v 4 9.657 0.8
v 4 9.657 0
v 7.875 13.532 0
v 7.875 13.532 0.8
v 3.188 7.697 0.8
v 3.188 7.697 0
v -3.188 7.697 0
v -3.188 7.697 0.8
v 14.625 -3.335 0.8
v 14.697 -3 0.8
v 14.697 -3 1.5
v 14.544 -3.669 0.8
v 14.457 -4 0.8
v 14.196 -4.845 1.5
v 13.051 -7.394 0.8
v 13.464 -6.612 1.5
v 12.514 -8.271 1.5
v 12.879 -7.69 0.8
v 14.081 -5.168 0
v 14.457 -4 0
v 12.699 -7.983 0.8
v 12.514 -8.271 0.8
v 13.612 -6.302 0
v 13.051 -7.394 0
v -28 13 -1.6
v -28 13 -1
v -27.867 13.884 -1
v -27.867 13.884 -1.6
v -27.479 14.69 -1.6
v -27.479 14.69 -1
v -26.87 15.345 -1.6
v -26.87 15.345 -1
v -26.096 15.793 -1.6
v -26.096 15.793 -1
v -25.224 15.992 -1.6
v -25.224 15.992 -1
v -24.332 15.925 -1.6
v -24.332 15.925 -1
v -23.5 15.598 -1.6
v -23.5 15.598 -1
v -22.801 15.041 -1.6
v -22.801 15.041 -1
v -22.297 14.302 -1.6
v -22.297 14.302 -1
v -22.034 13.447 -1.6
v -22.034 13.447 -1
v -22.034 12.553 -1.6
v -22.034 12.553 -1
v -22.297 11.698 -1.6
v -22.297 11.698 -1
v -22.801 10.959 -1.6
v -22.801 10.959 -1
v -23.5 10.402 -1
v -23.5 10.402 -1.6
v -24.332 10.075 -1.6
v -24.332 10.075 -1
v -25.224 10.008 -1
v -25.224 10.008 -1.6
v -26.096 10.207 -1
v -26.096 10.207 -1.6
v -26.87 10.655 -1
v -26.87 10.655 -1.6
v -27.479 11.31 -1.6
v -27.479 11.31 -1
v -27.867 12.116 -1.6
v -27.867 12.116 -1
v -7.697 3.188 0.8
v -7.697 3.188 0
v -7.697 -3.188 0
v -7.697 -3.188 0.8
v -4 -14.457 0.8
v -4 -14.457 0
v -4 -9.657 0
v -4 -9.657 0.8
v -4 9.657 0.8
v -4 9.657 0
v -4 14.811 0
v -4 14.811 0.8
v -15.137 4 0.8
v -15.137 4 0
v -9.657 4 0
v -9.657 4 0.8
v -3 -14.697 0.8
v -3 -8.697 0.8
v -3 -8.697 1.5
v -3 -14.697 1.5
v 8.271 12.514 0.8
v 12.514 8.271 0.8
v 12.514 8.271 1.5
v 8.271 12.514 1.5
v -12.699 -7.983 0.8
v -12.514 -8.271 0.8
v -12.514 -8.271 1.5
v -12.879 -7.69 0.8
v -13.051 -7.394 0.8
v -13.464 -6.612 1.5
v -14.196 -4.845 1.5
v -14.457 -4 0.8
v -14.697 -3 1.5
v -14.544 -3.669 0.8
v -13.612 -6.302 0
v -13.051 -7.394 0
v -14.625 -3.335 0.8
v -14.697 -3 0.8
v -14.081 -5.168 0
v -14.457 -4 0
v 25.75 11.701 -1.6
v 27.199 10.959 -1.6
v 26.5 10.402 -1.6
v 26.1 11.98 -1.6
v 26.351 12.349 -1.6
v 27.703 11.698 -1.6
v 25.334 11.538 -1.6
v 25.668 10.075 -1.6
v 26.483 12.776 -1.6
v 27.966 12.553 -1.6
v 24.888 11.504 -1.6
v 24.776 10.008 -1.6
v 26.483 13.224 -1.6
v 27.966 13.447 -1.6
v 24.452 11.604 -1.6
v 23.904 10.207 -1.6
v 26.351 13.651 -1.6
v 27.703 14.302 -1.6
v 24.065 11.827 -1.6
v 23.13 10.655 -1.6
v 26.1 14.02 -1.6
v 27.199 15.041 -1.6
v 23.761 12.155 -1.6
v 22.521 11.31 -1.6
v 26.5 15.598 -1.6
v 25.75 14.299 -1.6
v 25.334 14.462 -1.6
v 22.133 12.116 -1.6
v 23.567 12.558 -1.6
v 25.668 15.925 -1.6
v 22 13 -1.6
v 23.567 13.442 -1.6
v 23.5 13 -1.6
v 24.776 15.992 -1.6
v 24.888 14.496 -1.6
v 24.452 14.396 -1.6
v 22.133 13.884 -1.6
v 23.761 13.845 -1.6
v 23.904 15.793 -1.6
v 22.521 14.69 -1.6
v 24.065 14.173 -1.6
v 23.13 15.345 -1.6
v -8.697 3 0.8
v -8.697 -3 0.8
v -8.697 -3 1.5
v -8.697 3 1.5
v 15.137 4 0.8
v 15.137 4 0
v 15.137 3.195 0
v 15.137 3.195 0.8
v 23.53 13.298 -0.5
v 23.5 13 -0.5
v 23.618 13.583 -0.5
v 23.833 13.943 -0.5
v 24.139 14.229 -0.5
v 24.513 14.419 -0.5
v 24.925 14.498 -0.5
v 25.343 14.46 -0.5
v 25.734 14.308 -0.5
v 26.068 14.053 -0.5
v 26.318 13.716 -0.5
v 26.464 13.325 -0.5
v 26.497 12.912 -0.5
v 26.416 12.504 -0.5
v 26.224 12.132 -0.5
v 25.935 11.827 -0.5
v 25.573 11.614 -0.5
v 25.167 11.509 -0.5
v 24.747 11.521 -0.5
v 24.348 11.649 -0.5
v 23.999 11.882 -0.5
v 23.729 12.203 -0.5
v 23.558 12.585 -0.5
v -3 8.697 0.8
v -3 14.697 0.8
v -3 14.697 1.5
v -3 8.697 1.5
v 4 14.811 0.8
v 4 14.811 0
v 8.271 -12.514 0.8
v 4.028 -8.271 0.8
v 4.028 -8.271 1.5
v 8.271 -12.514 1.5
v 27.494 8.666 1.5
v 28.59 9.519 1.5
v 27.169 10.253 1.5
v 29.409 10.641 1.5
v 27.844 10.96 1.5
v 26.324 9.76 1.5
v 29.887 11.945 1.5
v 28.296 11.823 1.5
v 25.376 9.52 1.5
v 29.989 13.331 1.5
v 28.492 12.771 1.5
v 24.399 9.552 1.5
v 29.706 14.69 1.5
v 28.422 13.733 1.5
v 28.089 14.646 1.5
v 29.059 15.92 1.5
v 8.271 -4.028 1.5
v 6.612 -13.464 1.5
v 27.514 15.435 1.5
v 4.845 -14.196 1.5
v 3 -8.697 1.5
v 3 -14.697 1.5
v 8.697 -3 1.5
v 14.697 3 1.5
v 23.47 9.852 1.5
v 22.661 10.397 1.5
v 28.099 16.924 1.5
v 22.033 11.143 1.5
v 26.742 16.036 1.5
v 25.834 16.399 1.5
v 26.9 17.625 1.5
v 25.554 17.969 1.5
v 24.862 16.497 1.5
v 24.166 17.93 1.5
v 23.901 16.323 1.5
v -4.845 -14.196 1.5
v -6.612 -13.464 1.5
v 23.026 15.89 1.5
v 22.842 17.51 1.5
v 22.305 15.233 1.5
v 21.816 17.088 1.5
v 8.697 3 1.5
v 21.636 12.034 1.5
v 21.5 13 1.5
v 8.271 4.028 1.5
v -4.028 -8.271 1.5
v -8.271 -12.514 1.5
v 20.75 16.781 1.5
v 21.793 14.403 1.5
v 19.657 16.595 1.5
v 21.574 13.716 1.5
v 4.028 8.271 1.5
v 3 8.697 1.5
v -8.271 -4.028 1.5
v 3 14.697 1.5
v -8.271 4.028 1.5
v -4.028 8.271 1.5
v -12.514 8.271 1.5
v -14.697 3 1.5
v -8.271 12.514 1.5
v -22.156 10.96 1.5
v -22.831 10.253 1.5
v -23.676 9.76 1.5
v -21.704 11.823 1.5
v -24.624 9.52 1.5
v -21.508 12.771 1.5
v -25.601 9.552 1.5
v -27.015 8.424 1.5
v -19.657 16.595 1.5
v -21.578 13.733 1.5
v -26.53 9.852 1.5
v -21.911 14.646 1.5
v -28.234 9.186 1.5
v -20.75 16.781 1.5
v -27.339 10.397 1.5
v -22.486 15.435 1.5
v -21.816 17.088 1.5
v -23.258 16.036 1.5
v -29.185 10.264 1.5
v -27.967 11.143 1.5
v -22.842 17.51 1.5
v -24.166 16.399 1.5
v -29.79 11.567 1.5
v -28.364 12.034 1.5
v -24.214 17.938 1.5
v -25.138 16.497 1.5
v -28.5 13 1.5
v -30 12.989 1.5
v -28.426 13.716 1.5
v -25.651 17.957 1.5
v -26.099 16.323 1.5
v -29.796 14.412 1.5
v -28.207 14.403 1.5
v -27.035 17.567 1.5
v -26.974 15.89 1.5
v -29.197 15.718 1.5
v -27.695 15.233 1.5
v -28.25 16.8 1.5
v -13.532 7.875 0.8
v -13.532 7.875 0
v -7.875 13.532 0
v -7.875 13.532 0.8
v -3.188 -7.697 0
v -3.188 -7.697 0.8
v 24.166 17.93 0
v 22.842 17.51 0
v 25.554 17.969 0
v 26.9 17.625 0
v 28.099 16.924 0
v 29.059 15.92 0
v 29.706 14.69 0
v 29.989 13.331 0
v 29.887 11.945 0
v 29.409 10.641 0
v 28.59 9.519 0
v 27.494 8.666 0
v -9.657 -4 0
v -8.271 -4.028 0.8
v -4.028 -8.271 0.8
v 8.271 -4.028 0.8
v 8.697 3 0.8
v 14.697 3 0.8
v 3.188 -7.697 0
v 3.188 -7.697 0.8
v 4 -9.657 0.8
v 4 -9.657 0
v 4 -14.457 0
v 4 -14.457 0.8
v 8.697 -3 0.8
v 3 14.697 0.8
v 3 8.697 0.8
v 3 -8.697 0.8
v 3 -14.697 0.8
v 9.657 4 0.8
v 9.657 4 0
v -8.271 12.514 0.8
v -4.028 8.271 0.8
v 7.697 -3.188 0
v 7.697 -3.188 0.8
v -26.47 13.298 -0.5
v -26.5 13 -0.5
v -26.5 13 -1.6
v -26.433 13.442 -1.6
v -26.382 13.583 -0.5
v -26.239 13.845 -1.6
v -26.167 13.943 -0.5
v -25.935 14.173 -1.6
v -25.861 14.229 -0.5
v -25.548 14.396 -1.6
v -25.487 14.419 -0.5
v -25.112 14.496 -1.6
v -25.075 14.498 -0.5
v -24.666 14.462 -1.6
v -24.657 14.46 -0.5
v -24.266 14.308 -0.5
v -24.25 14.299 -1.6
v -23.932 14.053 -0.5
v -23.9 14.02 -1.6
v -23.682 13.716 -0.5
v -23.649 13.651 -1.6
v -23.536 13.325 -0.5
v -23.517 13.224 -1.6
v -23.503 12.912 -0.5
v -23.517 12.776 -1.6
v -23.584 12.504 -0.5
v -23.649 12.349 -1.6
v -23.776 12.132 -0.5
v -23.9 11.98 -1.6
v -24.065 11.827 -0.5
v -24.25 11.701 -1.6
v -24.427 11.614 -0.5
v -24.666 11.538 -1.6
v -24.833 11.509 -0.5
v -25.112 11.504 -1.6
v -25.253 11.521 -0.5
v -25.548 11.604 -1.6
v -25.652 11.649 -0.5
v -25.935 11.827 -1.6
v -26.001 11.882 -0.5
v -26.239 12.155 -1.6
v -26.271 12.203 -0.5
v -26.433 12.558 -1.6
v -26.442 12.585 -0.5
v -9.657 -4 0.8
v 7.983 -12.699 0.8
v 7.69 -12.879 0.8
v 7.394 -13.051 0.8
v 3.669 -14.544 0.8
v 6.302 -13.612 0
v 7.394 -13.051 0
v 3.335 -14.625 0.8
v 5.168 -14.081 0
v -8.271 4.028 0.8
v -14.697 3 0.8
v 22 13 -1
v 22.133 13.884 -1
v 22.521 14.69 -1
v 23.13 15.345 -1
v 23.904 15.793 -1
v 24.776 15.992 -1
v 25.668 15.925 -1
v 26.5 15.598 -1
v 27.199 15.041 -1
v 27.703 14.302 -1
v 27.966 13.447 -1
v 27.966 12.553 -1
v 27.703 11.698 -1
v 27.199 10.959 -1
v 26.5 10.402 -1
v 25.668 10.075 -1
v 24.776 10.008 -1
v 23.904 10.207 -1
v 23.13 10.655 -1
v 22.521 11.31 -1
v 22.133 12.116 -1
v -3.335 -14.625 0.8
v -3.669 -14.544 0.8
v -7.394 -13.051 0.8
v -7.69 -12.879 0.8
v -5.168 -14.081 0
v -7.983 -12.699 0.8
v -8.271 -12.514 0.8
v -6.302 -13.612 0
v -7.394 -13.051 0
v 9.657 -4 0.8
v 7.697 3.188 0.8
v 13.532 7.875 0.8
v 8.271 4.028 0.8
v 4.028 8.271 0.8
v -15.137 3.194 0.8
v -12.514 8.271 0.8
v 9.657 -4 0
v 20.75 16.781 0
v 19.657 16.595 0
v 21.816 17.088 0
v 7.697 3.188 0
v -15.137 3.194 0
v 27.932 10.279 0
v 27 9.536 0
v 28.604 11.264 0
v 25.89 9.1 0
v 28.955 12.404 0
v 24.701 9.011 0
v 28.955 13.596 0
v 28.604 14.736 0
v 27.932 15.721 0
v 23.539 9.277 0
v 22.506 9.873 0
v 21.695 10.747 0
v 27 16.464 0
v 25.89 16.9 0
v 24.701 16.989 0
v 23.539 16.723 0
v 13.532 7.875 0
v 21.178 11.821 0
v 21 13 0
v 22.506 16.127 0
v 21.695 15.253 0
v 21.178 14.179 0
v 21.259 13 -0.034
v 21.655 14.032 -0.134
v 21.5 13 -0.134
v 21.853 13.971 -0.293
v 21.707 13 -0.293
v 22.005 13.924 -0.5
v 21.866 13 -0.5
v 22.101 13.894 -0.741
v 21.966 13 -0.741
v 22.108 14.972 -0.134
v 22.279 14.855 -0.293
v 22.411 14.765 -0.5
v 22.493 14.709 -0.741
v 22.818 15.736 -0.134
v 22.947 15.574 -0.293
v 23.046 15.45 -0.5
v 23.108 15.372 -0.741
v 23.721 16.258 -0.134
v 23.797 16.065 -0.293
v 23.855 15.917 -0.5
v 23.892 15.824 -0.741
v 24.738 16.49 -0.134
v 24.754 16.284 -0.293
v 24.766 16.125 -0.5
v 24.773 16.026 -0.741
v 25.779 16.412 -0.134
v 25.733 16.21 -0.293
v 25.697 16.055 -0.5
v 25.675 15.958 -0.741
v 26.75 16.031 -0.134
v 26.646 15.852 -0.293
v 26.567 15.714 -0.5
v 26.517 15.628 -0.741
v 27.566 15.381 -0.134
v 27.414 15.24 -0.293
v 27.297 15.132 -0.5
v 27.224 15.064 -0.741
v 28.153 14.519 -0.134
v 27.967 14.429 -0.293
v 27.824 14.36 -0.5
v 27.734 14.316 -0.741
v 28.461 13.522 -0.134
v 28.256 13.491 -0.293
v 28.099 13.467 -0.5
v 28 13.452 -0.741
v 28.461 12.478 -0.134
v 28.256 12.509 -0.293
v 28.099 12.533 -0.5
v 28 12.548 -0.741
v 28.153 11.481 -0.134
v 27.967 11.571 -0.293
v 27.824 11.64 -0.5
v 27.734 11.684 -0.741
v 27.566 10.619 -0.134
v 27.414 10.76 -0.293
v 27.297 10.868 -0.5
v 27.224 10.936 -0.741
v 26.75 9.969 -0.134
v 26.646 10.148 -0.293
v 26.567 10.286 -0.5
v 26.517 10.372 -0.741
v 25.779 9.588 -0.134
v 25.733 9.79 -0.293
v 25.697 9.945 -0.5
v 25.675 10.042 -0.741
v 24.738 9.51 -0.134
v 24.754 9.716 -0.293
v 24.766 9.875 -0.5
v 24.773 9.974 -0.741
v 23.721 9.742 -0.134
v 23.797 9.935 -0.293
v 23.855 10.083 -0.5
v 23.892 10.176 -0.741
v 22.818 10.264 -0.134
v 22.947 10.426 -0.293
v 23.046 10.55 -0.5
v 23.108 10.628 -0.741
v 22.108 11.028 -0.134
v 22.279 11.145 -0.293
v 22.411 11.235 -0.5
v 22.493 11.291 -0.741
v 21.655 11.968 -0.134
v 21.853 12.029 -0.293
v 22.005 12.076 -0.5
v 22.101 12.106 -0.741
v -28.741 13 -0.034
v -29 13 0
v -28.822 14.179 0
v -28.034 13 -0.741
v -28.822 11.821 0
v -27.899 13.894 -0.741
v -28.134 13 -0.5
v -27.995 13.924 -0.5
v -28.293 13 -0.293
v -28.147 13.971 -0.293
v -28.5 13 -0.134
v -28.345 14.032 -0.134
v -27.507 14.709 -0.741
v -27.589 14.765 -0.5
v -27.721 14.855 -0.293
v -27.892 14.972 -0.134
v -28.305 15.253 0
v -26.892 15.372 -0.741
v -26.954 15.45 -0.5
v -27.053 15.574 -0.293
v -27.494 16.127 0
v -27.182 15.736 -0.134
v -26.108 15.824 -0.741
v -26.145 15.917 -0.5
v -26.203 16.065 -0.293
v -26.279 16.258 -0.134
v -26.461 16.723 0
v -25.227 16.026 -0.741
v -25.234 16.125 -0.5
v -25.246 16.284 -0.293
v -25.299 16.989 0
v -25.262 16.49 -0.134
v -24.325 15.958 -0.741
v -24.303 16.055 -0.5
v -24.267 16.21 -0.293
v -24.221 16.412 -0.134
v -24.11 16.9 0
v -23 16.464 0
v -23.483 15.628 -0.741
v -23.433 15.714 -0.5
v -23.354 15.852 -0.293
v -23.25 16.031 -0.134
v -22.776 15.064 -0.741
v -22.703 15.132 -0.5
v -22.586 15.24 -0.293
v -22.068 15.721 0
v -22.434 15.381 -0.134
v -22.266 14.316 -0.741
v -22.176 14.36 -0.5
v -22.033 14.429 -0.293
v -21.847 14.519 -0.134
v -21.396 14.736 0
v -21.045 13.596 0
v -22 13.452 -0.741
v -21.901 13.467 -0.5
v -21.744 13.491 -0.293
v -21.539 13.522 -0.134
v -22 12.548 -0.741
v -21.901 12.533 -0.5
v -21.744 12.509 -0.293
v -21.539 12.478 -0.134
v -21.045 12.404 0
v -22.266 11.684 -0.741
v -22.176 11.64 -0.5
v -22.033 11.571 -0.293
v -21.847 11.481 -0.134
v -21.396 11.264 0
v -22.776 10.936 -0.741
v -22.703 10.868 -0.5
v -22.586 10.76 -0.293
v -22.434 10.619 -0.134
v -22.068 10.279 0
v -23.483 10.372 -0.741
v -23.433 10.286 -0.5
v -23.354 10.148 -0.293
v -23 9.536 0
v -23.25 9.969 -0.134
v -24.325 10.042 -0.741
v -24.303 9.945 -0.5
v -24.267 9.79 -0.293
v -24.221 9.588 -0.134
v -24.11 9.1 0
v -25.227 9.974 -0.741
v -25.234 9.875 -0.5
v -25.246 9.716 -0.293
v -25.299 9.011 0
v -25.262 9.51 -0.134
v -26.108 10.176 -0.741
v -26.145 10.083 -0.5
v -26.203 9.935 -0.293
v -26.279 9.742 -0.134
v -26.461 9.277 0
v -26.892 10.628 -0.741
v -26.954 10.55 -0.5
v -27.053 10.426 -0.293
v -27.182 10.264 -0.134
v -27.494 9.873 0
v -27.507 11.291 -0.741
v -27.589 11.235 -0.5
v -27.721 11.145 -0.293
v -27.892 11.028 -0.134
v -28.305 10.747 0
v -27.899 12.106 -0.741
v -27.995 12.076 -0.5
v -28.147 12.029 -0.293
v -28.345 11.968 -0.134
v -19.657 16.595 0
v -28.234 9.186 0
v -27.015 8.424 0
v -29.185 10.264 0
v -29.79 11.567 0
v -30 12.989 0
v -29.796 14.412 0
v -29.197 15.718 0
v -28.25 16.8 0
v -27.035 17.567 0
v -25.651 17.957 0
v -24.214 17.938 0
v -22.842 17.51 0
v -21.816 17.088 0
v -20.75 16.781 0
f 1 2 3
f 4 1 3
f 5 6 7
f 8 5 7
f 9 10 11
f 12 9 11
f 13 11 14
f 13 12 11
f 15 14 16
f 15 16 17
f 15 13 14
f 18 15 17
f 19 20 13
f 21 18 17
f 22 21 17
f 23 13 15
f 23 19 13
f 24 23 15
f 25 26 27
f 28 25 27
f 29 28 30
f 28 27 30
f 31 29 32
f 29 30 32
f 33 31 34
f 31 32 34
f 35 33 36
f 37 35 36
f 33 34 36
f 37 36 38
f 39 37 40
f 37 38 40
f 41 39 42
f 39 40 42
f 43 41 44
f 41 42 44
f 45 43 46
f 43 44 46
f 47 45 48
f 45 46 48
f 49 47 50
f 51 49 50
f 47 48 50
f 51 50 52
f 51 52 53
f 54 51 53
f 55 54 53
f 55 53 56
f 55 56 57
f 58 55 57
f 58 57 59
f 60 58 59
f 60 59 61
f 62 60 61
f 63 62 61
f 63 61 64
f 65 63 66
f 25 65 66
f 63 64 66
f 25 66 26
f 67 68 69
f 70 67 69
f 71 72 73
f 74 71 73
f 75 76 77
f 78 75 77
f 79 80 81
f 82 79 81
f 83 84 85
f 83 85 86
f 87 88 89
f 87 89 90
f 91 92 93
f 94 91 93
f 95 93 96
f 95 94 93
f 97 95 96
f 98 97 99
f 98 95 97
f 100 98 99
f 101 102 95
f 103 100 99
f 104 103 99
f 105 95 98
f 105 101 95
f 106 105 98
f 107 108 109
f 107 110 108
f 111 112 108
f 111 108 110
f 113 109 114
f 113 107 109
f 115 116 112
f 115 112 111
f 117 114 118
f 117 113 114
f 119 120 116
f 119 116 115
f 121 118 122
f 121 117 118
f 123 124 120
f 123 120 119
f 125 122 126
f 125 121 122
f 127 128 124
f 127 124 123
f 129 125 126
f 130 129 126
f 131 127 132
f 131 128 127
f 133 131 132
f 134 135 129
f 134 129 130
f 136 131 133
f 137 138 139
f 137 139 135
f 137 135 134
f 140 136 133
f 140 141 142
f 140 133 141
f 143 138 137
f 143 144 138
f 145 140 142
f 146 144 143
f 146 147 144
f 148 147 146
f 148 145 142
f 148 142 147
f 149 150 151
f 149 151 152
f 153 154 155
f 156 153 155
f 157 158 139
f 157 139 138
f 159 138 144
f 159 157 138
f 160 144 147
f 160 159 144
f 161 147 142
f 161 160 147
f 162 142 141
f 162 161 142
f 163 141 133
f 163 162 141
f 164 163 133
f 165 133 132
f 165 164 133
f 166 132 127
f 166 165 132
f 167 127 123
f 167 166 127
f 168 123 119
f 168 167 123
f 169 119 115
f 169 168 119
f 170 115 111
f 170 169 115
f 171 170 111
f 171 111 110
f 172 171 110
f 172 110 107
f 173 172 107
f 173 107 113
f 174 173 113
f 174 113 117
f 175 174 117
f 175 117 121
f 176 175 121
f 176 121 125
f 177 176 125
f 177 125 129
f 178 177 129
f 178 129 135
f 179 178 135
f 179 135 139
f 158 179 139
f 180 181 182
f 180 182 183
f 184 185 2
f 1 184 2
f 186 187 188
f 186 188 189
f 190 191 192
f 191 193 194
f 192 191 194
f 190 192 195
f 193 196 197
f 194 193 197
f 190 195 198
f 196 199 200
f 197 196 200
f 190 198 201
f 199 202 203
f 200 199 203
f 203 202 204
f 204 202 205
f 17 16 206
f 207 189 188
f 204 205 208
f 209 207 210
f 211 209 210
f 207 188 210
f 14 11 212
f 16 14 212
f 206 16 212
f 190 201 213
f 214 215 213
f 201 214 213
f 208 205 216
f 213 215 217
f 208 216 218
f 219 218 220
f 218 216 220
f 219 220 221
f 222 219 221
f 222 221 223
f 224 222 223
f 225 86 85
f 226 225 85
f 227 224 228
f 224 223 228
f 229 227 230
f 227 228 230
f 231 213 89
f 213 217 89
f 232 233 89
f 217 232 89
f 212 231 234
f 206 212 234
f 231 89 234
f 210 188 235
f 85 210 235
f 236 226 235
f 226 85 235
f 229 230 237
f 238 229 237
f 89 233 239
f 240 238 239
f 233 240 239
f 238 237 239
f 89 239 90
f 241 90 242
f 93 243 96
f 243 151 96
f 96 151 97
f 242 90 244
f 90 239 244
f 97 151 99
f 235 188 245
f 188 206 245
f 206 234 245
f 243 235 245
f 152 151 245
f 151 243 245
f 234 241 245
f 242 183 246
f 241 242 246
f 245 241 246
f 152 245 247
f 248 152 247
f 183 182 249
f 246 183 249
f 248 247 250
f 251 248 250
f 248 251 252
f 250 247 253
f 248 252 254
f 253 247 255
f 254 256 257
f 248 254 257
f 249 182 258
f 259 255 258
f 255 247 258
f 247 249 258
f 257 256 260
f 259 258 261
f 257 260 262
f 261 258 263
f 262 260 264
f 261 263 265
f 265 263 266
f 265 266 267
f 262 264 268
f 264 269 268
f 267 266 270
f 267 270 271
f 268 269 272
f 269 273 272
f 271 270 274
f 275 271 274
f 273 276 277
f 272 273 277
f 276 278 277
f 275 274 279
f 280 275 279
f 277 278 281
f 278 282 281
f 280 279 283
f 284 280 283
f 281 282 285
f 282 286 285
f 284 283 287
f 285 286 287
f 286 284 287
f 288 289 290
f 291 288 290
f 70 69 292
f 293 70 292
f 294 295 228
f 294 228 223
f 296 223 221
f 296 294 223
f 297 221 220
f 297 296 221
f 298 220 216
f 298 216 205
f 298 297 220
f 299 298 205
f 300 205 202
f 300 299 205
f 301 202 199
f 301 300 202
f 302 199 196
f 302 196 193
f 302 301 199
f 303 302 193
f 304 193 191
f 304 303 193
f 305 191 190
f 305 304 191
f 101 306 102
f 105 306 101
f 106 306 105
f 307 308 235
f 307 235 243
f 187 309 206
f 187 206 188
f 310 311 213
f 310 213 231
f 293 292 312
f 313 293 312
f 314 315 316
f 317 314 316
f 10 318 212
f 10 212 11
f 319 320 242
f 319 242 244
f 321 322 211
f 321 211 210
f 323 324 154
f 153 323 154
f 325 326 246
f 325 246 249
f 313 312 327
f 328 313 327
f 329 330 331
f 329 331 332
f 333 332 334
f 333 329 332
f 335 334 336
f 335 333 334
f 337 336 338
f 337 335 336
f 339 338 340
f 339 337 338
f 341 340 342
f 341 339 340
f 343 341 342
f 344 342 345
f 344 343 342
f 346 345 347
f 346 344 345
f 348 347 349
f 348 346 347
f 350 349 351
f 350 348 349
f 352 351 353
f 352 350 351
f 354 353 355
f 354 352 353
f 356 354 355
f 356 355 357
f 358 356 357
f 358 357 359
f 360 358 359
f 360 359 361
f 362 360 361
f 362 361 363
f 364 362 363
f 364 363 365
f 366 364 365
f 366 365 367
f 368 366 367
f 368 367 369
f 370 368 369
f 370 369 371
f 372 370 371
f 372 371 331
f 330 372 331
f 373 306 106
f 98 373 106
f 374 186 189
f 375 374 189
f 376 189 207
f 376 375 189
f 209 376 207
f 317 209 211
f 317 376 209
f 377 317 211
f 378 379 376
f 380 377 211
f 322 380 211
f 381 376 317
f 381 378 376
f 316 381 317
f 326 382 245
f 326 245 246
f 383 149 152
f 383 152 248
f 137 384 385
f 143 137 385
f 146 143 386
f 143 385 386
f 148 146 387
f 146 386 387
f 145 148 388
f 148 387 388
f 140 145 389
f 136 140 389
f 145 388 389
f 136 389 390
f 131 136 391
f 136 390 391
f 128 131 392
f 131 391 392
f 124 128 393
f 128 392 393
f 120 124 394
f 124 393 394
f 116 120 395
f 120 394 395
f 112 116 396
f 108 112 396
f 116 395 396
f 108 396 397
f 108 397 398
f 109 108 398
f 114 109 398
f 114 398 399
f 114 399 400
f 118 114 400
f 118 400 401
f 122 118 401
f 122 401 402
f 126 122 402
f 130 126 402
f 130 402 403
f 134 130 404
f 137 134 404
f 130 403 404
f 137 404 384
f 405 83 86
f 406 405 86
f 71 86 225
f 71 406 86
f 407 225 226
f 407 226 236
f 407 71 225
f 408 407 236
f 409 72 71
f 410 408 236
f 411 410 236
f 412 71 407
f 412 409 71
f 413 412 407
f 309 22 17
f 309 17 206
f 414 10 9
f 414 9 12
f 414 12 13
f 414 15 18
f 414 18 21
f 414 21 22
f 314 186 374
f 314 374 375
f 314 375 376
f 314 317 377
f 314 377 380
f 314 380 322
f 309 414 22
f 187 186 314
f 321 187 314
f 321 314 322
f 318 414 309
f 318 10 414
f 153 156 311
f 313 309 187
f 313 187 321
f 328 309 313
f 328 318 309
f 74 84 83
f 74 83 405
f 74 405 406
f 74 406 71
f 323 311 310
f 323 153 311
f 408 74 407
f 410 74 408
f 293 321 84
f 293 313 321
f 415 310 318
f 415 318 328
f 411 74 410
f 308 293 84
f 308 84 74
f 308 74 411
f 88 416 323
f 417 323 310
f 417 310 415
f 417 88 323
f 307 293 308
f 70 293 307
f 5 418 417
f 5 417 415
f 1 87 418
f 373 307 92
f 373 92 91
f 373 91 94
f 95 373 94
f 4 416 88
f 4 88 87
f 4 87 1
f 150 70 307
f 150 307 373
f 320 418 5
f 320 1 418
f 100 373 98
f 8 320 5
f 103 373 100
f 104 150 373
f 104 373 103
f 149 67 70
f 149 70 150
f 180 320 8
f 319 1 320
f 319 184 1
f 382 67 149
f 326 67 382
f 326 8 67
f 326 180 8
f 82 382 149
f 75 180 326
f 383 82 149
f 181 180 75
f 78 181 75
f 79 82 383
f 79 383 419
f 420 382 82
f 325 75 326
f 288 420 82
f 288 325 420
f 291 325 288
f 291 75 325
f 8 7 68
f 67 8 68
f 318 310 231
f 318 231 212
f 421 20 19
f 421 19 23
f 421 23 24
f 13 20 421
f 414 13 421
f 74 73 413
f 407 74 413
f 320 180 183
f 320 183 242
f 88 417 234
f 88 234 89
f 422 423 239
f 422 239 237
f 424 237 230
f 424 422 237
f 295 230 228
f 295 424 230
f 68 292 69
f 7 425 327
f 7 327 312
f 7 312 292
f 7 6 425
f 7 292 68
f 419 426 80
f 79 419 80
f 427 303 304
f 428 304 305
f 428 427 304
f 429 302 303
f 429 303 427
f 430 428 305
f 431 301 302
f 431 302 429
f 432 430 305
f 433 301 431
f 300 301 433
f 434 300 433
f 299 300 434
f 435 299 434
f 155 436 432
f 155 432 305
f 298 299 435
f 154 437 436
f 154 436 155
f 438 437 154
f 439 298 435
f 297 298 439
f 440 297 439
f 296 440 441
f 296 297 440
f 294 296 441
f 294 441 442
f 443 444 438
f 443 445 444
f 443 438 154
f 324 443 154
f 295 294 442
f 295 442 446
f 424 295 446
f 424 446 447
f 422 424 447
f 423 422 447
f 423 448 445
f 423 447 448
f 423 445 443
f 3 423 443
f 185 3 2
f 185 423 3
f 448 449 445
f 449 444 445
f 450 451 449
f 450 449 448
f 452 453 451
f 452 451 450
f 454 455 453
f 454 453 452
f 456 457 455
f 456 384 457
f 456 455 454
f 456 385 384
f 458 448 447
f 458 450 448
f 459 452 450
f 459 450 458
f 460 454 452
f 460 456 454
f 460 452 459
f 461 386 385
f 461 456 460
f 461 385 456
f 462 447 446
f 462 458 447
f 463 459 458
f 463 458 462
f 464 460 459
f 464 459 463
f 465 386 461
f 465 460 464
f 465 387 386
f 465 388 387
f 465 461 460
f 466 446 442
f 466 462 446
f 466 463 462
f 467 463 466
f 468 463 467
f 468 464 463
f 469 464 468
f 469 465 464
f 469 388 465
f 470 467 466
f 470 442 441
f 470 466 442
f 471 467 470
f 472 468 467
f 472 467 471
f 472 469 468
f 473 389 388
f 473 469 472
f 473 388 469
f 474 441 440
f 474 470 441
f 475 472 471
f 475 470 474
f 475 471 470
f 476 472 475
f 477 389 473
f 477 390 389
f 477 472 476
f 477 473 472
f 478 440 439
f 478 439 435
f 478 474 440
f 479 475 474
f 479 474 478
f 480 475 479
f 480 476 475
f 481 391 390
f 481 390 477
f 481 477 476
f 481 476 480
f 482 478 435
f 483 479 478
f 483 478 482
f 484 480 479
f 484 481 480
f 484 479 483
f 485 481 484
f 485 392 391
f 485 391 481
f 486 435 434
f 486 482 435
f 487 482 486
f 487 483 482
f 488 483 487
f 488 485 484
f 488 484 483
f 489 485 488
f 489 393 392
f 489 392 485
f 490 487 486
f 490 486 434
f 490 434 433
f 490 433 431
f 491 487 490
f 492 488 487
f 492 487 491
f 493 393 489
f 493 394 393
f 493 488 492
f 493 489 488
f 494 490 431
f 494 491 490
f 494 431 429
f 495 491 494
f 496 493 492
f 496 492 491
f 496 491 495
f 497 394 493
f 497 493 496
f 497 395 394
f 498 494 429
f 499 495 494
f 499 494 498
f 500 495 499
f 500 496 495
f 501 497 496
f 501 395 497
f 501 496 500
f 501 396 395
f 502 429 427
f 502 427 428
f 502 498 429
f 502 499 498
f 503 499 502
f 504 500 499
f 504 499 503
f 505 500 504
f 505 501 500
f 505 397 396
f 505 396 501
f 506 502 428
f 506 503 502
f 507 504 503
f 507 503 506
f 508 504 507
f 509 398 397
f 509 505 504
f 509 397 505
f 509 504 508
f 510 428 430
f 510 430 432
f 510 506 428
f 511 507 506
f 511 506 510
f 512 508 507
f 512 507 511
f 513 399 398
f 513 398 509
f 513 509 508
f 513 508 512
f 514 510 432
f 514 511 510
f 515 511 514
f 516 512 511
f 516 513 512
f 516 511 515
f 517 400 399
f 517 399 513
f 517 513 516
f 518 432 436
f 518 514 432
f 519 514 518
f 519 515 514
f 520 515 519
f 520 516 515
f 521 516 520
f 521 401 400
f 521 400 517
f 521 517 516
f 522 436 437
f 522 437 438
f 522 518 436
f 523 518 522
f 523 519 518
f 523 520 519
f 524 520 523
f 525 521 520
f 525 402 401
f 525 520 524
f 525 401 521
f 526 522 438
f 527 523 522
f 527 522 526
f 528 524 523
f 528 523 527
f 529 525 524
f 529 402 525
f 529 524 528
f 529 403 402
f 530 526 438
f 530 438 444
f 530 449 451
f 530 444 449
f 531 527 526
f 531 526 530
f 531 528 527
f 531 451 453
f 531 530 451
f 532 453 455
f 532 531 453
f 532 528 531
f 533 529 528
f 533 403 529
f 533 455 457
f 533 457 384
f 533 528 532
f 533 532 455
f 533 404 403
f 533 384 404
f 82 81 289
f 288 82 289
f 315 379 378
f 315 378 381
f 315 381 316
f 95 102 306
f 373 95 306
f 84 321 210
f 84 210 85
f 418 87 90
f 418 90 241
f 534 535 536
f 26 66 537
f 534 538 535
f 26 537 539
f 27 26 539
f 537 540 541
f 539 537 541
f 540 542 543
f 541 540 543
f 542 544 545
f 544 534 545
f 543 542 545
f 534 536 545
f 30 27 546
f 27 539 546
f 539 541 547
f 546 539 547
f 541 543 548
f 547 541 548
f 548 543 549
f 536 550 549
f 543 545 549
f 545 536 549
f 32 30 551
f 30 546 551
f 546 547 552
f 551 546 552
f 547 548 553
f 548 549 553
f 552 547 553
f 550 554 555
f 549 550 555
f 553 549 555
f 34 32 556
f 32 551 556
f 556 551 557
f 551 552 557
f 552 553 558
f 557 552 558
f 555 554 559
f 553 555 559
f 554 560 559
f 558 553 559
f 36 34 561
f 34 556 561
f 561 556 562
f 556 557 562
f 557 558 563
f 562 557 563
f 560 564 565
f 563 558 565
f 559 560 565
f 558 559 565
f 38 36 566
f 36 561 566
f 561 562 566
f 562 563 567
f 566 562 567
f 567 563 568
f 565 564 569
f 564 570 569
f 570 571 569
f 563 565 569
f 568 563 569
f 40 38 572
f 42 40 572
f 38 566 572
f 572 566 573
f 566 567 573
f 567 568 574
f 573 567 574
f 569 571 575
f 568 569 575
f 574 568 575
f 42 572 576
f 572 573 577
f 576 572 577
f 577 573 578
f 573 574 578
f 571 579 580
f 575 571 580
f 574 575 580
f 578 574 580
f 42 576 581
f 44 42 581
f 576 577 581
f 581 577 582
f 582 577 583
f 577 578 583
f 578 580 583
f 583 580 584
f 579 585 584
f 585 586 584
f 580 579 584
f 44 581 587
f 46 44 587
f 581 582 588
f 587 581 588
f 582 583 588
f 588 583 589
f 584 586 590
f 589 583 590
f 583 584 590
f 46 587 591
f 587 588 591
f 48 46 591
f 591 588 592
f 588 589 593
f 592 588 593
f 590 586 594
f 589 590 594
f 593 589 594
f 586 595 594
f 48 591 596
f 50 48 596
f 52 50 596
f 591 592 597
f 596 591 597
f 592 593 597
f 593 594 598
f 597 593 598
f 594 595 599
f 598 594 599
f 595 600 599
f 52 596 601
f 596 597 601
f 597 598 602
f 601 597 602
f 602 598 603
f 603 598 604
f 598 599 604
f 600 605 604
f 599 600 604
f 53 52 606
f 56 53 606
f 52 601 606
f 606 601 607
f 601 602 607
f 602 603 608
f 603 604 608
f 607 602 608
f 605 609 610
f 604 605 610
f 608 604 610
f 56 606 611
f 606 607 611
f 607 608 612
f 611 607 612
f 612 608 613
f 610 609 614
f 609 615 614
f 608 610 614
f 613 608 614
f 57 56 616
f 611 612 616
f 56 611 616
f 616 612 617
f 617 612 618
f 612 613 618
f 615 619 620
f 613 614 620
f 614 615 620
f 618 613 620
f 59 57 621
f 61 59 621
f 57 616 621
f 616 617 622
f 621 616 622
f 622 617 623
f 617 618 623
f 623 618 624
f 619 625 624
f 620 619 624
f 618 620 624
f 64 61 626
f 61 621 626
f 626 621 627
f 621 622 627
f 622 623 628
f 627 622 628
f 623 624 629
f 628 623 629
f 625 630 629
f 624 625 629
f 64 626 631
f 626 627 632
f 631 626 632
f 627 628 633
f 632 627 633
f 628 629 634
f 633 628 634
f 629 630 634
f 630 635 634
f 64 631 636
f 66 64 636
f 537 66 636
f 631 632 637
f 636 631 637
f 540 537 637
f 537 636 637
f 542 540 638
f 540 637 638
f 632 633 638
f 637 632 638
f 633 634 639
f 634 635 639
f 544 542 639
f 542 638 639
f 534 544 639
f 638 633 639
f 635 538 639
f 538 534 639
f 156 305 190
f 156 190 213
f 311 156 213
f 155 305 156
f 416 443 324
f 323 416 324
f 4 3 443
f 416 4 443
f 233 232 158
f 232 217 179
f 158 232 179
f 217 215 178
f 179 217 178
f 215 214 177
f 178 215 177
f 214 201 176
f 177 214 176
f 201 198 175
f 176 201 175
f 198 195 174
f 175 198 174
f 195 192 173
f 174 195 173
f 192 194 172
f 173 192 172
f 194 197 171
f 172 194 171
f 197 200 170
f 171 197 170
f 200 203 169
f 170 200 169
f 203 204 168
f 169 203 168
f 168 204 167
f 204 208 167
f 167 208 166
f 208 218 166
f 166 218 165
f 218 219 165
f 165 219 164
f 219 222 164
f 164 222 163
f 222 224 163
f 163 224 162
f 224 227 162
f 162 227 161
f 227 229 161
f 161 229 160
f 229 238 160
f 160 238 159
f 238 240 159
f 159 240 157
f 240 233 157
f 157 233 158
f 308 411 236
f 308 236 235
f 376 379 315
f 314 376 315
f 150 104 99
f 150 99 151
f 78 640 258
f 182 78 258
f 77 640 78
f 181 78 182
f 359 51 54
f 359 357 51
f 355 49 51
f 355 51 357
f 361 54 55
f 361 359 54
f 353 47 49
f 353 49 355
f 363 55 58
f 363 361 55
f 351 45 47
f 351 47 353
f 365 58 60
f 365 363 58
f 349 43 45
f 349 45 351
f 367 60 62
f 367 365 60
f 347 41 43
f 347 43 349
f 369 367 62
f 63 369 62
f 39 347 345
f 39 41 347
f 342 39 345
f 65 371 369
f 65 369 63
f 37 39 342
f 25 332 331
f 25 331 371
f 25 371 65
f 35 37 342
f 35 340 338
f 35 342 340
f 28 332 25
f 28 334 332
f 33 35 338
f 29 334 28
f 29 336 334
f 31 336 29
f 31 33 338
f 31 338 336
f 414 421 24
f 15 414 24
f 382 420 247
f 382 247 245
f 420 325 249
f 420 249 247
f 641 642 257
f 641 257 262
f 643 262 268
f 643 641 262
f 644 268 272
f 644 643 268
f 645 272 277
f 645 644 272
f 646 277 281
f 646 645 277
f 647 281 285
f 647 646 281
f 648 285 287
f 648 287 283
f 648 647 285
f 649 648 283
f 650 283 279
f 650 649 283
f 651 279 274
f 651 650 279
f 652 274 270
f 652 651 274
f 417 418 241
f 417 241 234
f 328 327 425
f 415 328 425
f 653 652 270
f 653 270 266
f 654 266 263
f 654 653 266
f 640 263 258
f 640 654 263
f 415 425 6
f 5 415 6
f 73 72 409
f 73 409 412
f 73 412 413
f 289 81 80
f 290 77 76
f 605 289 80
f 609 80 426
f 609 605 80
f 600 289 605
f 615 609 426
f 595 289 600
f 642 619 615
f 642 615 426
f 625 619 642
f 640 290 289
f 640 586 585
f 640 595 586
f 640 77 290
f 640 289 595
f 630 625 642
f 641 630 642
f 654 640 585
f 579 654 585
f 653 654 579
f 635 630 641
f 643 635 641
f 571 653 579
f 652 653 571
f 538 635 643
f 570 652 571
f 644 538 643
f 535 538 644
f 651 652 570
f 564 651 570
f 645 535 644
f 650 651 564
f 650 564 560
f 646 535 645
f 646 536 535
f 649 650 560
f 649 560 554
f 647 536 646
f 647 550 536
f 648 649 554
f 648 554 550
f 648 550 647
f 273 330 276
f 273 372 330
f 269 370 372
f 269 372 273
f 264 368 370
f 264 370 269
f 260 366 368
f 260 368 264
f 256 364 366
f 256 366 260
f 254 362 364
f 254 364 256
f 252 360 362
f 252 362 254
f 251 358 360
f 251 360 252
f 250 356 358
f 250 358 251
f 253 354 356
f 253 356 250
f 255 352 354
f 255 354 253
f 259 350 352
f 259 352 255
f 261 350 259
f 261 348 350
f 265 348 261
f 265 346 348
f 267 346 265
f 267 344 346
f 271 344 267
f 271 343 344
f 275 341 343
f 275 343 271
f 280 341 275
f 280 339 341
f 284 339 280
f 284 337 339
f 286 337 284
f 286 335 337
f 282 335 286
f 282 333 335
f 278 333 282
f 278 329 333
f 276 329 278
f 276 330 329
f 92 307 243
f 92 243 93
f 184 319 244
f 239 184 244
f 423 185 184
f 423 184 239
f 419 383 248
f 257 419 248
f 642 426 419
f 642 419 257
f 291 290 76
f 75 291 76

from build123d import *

# Parameters (mm, degrees)
SKETCH_1_R          = 1.5
EXTRUDE_1_DEPTH     = 1.5
CUT_EXTRUDE_2_DEPTH = 0.8
SKETCH_4_R          = 3
SKETCH_4_R_2        = 1.5
EXTRUDE_2_DEPTH     = 1.6
FILLET_1_R          = 1
CHAMFER_1_SIZE      = 2


with BuildPart() as part:
    # Эскиз1 → Бобышка-Вытянуть1 (new body)
    with BuildSketch(Plane.XY):
        with BuildLine():
            Line((-3, 14.696938457), (-3, 8.696938457))
            Line((-3, 8.696938457), (3, 8.696938457))
            Line((3, 8.696938457), (3, 14.696938457))
            Line((3, 14.696938457), (19.657078674, 16.594796577))
            ThreePointArc((19.657078674, 16.594796577), (21.287556094, 16.919662188), (22.841677521, 17.51017118))
            ThreePointArc((22.841677521, 17.51017118), (29.425159504, 15.327651899), (27.493638863, 8.666206601))
            Line((27.493638863, 8.666206601), (14.696938457, 3))
            Line((14.696938457, 3), (8.696938457, 3))
            Line((8.696938457, 3), (8.696938457, -3))
            Line((8.696938457, -3), (14.696938457, -3))
            ThreePointArc((14.696938457, -3), (13.858192988, -5.740251485), (12.513625189, -8.270984502))
            Line((12.513625189, -8.270984502), (8.270984502, -4.028343815))
            Line((8.270984502, -4.028343815), (4.028343815, -8.270984502))
            Line((4.028343815, -8.270984502), (8.270984502, -12.513625189))
            ThreePointArc((8.270984502, -12.513625189), (5.740251485, -13.858192988), (3, -14.696938457))
            Line((3, -14.696938457), (3, -8.696938457))
            Line((3, -8.696938457), (-3, -8.696938457))
            Line((-3, -8.696938457), (-3, -14.696938457))
            ThreePointArc((-3, -14.696938457), (-5.740251485, -13.858192988), (-8.270984502, -12.513625189))
            Line((-8.270984502, -12.513625189), (-4.028343815, -8.270984502))
            Line((-4.028343815, -8.270984502), (-8.270984502, -4.028343815))
            Line((-8.270984502, -4.028343815), (-12.513625189, -8.270984502))
            ThreePointArc((-12.513625189, -8.270984502), (-13.858192988, -5.740251485), (-14.696938457, -3))
            Line((-14.696938457, -3), (-8.696938457, -3))
            Line((-8.696938457, -3), (-8.696938457, 3))
            Line((-8.696938457, 3), (-14.696938457, 3))
            Line((-14.696938457, 3), (-27.014954435, 8.423980045))
            ThreePointArc((-27.014954435, 8.423980045), (-29.543661072, 15.086898192), (-22.841677521, 17.51017118))
            ThreePointArc((-22.841677521, 17.51017118), (-21.287556094, 16.919662188), (-19.657078674, 16.594796577))
            Line((-19.657078674, 16.594796577), (-3, 14.696938457))
        make_face()
        with Locations((-25, 13)):
            Circle(SKETCH_1_R, mode=Mode.SUBTRACT)
        with Locations((25, 13)):
            Circle(SKETCH_1_R, mode=Mode.SUBTRACT)
        Polygon((4.028343815, 8.270984502), (8.270984502, 4.028343815), (12.513625189, 8.270984502), (8.270984502, 12.513625189), align=None, mode=Mode.SUBTRACT)
        Polygon((-8.270984502, 4.028343815), (-4.028343815, 8.270984502), (-8.270984502, 12.513625189), (-12.513625189, 8.270984502), align=None, mode=Mode.SUBTRACT)
    extrude(amount=EXTRUDE_1_DEPTH)

    # Эскиз3 → Вырез-Вытянуть2 (cut)
    with BuildSketch(Plane(origin=(0, 0, 0), x_dir=(-1, 0, 0), z_dir=(0, 0, -1))):
        Polygon((-4, 7.696938457), (-4, 9.656854249), (-7.87527044, 13.53212469), (-13.53212469, 7.87527044), (-9.656854249, 4), (-7.696938457, 4), (-7.696938457, 3.188176298), (-3.188176298, 7.696938457), align=None)
        Polygon((-8.270984502, 4.028343815), (-12.513625189, 8.270984502), (-8.270984502, 12.513625189), (-4.028343815, 8.270984502), align=None, mode=Mode.SUBTRACT)
        Polygon((-2.614130252, 8.270984502), (-4, 9.656854249), (-4, 7.696938457), (-3.188176298, 7.696938457), align=None)
        Polygon((-3, 14.696938457), (-4, 14.81087549), (-4, 9.656854249), (-2.614130252, 8.270984502), (-3.188176298, 7.696938457), (3.188176298, 7.696938457), (2.614130252, 8.270984502), (4, 9.656854249), (4, 14.81087549), (3, 14.696938457), (3, 8.696938457), (-3, 8.696938457), align=None)
        Polygon((4, 7.696938457), (4, 9.656854249), (2.614130252, 8.270984502), (3.188176298, 7.696938457), align=None)
        Polygon((7.87527044, 13.53212469), (4, 9.656854249), (4, 7.696938457), (3.188176298, 7.696938457), (7.696938457, 3.188176298), (7.696938457, 4), (9.656854249, 4), (13.53212469, 7.87527044), align=None)
        Polygon((4.028343815, 8.270984502), (8.270984502, 12.513625189), (12.513625189, 8.270984502), (8.270984502, 4.028343815), align=None, mode=Mode.SUBTRACT)
        Polygon((7.696938457, 4), (7.696938457, 3.188176298), (8.270984502, 2.614130252), (9.656854249, 4), align=None)
        with BuildLine():
            Line((8.270984502, 2.614130252), (7.696938457, 3.188176298))
            Line((7.696938457, 3.188176298), (7.696938457, -3.188176298))
            Line((7.696938457, -3.188176298), (8.270984502, -2.614130252))
            Line((8.270984502, -2.614130252), (9.656854249, -4))
            Line((9.656854249, -4), (14.456832295, -4))
            ThreePointArc((14.456832295, -4), (14.585458075, -3.502058358), (14.696938457, -3))
            Line((14.696938457, -3), (8.696938457, -3))
            Line((8.696938457, -3), (8.696938457, 3))
            Line((8.696938457, 3), (14.696938457, 3))
            Line((14.696938457, 3), (15.137314264, 3.193910253))
            Line((15.137314264, 3.193910253), (15.137314264, 4))
            Line((15.137314264, 4), (9.656854249, 4))
            Line((9.656854249, 4), (8.270984502, 2.614130252))
        make_face()
        Polygon((8.270984502, -2.614130252), (7.696938457, -3.188176298), (7.696938457, -4), (9.656854249, -4), align=None)
        with BuildLine():
            Line((7.696938457, -4), (7.696938457, -3.188176298))
            Line((7.696938457, -3.188176298), (3.188176298, -7.696938457))
            Line((3.188176298, -7.696938457), (4, -7.696938457))
            Line((4, -7.696938457), (4, -9.656854249))
            Line((4, -9.656854249), (7.394097025, -13.050951275))
            ThreePointArc((7.394097025, -13.050951275), (7.837147099, -12.789805525), (8.270984502, -12.513625189))
            Line((8.270984502, -12.513625189), (4.028343815, -8.270984502))
            Line((4.028343815, -8.270984502), (8.270984502, -4.028343815))
            Line((8.270984502, -4.028343815), (12.513625189, -8.270984502))
            ThreePointArc((12.513625189, -8.270984502), (12.789805525, -7.837147099), (13.050951275, -7.394097025))
            Line((13.050951275, -7.394097025), (9.656854249, -4))
            Line((9.656854249, -4), (7.696938457, -4))
        make_face()
        with BuildLine():
            Line((3.188176298, -7.696938457), (-3.188176298, -7.696938457))
            Line((-3.188176298, -7.696938457), (-2.614130252, -8.270984502))
            Line((-2.614130252, -8.270984502), (-4, -9.656854249))
            Line((-4, -9.656854249), (-4, -14.456832295))
            ThreePointArc((-4, -14.456832295), (-3.502058358, -14.585458075), (-3, -14.696938457))
            Line((-3, -14.696938457), (-3, -8.696938457))
            Line((-3, -8.696938457), (3, -8.696938457))
            Line((3, -8.696938457), (3, -14.696938457))
            ThreePointArc((3, -14.696938457), (3.502058358, -14.585458075), (4, -14.456832295))
            Line((4, -14.456832295), (4, -9.656854249))
            Line((4, -9.656854249), (2.614130252, -8.270984502))
            Line((2.614130252, -8.270984502), (3.188176298, -7.696938457))
        make_face()
        Polygon((4, -7.696938457), (3.188176298, -7.696938457), (2.614130252, -8.270984502), (4, -9.656854249), align=None)
        Polygon((-2.614130252, -8.270984502), (-3.188176298, -7.696938457), (-4, -7.696938457), (-4, -9.656854249), align=None)
        with BuildLine():
            Line((-3.188176298, -7.696938457), (-7.696938457, -3.188176298))
            Line((-7.696938457, -3.188176298), (-7.696938457, -4))
            Line((-7.696938457, -4), (-9.656854249, -4))
            Line((-9.656854249, -4), (-13.050951275, -7.394097025))
            ThreePointArc((-13.050951275, -7.394097025), (-12.789805525, -7.837147099), (-12.513625189, -8.270984502))
            Line((-12.513625189, -8.270984502), (-8.270984502, -4.028343815))
            Line((-8.270984502, -4.028343815), (-4.028343815, -8.270984502))
            Line((-4.028343815, -8.270984502), (-8.270984502, -12.513625189))
            ThreePointArc((-8.270984502, -12.513625189), (-7.837147099, -12.789805525), (-7.394097025, -13.050951275))
            Line((-7.394097025, -13.050951275), (-4, -9.656854249))
            Line((-4, -9.656854249), (-4, -7.696938457))
            Line((-4, -7.696938457), (-3.188176298, -7.696938457))
        make_face()
        Polygon((-7.696938457, -4), (-7.696938457, -3.188176298), (-8.270984502, -2.614130252), (-9.656854249, -4), align=None)
        with BuildLine():
            Line((-7.696938457, -3.188176298), (-7.696938457, 3.188176298))
            Line((-7.696938457, 3.188176298), (-8.270984502, 2.614130252))
            Line((-8.270984502, 2.614130252), (-9.656854249, 4))
            Line((-9.656854249, 4), (-15.137314264, 4))
            Line((-15.137314264, 4), (-15.137314264, 3.194992477))
            Line((-15.137314264, 3.194992477), (-14.696938457, 3))
            Line((-14.696938457, 3), (-8.696938457, 3))
            Line((-8.696938457, 3), (-8.696938457, -3))
            Line((-8.696938457, -3), (-14.696938457, -3))
            ThreePointArc((-14.696938457, -3), (-14.585458075, -3.502058358), (-14.456832295, -4))
            Line((-14.456832295, -4), (-9.656854249, -4))
            Line((-9.656854249, -4), (-8.270984502, -2.614130252))
            Line((-8.270984502, -2.614130252), (-7.696938457, -3.188176298))
        make_face()
        Polygon((-8.270984502, 2.614130252), (-7.696938457, 3.188176298), (-7.696938457, 4), (-9.656854249, 4), align=None)
    extrude(amount=-CUT_EXTRUDE_2_DEPTH, mode=Mode.SUBTRACT)

    # Эскиз4 → Бобышка-Вытянуть2 (add)
    with BuildSketch(Plane(origin=(0, 0, 0), x_dir=(-1, 0, 0), z_dir=(0, 0, -1))):
        with Locations((25, 13)):
            Circle(SKETCH_4_R)
        with Locations((25, 13)):
            Circle(SKETCH_4_R_2, mode=Mode.SUBTRACT)
        with Locations((-25, 13)):
            Circle(SKETCH_4_R)
        with Locations((-25, 13)):
            Circle(SKETCH_4_R_2, mode=Mode.SUBTRACT)
    extrude(amount=EXTRUDE_2_DEPTH)

    # Скругление1
    fillet_1_edges = [part.edges().sort_by_distance(p)[0] for p in [
        (-22, 13, 0),
        (28, 13, 0),
    ]]
    fillet(fillet_1_edges, radius=FILLET_1_R)

    # Фаска1
    chamfer_1_edges = [part.edges().sort_by_distance(p)[0] for p in [
        (-26.5, 13, 1.5),
        (23.5, 13, 1.5),
    ]]
    chamfer(chamfer_1_edges, length=CHAMFER_1_SIZE)


solid = part.part
